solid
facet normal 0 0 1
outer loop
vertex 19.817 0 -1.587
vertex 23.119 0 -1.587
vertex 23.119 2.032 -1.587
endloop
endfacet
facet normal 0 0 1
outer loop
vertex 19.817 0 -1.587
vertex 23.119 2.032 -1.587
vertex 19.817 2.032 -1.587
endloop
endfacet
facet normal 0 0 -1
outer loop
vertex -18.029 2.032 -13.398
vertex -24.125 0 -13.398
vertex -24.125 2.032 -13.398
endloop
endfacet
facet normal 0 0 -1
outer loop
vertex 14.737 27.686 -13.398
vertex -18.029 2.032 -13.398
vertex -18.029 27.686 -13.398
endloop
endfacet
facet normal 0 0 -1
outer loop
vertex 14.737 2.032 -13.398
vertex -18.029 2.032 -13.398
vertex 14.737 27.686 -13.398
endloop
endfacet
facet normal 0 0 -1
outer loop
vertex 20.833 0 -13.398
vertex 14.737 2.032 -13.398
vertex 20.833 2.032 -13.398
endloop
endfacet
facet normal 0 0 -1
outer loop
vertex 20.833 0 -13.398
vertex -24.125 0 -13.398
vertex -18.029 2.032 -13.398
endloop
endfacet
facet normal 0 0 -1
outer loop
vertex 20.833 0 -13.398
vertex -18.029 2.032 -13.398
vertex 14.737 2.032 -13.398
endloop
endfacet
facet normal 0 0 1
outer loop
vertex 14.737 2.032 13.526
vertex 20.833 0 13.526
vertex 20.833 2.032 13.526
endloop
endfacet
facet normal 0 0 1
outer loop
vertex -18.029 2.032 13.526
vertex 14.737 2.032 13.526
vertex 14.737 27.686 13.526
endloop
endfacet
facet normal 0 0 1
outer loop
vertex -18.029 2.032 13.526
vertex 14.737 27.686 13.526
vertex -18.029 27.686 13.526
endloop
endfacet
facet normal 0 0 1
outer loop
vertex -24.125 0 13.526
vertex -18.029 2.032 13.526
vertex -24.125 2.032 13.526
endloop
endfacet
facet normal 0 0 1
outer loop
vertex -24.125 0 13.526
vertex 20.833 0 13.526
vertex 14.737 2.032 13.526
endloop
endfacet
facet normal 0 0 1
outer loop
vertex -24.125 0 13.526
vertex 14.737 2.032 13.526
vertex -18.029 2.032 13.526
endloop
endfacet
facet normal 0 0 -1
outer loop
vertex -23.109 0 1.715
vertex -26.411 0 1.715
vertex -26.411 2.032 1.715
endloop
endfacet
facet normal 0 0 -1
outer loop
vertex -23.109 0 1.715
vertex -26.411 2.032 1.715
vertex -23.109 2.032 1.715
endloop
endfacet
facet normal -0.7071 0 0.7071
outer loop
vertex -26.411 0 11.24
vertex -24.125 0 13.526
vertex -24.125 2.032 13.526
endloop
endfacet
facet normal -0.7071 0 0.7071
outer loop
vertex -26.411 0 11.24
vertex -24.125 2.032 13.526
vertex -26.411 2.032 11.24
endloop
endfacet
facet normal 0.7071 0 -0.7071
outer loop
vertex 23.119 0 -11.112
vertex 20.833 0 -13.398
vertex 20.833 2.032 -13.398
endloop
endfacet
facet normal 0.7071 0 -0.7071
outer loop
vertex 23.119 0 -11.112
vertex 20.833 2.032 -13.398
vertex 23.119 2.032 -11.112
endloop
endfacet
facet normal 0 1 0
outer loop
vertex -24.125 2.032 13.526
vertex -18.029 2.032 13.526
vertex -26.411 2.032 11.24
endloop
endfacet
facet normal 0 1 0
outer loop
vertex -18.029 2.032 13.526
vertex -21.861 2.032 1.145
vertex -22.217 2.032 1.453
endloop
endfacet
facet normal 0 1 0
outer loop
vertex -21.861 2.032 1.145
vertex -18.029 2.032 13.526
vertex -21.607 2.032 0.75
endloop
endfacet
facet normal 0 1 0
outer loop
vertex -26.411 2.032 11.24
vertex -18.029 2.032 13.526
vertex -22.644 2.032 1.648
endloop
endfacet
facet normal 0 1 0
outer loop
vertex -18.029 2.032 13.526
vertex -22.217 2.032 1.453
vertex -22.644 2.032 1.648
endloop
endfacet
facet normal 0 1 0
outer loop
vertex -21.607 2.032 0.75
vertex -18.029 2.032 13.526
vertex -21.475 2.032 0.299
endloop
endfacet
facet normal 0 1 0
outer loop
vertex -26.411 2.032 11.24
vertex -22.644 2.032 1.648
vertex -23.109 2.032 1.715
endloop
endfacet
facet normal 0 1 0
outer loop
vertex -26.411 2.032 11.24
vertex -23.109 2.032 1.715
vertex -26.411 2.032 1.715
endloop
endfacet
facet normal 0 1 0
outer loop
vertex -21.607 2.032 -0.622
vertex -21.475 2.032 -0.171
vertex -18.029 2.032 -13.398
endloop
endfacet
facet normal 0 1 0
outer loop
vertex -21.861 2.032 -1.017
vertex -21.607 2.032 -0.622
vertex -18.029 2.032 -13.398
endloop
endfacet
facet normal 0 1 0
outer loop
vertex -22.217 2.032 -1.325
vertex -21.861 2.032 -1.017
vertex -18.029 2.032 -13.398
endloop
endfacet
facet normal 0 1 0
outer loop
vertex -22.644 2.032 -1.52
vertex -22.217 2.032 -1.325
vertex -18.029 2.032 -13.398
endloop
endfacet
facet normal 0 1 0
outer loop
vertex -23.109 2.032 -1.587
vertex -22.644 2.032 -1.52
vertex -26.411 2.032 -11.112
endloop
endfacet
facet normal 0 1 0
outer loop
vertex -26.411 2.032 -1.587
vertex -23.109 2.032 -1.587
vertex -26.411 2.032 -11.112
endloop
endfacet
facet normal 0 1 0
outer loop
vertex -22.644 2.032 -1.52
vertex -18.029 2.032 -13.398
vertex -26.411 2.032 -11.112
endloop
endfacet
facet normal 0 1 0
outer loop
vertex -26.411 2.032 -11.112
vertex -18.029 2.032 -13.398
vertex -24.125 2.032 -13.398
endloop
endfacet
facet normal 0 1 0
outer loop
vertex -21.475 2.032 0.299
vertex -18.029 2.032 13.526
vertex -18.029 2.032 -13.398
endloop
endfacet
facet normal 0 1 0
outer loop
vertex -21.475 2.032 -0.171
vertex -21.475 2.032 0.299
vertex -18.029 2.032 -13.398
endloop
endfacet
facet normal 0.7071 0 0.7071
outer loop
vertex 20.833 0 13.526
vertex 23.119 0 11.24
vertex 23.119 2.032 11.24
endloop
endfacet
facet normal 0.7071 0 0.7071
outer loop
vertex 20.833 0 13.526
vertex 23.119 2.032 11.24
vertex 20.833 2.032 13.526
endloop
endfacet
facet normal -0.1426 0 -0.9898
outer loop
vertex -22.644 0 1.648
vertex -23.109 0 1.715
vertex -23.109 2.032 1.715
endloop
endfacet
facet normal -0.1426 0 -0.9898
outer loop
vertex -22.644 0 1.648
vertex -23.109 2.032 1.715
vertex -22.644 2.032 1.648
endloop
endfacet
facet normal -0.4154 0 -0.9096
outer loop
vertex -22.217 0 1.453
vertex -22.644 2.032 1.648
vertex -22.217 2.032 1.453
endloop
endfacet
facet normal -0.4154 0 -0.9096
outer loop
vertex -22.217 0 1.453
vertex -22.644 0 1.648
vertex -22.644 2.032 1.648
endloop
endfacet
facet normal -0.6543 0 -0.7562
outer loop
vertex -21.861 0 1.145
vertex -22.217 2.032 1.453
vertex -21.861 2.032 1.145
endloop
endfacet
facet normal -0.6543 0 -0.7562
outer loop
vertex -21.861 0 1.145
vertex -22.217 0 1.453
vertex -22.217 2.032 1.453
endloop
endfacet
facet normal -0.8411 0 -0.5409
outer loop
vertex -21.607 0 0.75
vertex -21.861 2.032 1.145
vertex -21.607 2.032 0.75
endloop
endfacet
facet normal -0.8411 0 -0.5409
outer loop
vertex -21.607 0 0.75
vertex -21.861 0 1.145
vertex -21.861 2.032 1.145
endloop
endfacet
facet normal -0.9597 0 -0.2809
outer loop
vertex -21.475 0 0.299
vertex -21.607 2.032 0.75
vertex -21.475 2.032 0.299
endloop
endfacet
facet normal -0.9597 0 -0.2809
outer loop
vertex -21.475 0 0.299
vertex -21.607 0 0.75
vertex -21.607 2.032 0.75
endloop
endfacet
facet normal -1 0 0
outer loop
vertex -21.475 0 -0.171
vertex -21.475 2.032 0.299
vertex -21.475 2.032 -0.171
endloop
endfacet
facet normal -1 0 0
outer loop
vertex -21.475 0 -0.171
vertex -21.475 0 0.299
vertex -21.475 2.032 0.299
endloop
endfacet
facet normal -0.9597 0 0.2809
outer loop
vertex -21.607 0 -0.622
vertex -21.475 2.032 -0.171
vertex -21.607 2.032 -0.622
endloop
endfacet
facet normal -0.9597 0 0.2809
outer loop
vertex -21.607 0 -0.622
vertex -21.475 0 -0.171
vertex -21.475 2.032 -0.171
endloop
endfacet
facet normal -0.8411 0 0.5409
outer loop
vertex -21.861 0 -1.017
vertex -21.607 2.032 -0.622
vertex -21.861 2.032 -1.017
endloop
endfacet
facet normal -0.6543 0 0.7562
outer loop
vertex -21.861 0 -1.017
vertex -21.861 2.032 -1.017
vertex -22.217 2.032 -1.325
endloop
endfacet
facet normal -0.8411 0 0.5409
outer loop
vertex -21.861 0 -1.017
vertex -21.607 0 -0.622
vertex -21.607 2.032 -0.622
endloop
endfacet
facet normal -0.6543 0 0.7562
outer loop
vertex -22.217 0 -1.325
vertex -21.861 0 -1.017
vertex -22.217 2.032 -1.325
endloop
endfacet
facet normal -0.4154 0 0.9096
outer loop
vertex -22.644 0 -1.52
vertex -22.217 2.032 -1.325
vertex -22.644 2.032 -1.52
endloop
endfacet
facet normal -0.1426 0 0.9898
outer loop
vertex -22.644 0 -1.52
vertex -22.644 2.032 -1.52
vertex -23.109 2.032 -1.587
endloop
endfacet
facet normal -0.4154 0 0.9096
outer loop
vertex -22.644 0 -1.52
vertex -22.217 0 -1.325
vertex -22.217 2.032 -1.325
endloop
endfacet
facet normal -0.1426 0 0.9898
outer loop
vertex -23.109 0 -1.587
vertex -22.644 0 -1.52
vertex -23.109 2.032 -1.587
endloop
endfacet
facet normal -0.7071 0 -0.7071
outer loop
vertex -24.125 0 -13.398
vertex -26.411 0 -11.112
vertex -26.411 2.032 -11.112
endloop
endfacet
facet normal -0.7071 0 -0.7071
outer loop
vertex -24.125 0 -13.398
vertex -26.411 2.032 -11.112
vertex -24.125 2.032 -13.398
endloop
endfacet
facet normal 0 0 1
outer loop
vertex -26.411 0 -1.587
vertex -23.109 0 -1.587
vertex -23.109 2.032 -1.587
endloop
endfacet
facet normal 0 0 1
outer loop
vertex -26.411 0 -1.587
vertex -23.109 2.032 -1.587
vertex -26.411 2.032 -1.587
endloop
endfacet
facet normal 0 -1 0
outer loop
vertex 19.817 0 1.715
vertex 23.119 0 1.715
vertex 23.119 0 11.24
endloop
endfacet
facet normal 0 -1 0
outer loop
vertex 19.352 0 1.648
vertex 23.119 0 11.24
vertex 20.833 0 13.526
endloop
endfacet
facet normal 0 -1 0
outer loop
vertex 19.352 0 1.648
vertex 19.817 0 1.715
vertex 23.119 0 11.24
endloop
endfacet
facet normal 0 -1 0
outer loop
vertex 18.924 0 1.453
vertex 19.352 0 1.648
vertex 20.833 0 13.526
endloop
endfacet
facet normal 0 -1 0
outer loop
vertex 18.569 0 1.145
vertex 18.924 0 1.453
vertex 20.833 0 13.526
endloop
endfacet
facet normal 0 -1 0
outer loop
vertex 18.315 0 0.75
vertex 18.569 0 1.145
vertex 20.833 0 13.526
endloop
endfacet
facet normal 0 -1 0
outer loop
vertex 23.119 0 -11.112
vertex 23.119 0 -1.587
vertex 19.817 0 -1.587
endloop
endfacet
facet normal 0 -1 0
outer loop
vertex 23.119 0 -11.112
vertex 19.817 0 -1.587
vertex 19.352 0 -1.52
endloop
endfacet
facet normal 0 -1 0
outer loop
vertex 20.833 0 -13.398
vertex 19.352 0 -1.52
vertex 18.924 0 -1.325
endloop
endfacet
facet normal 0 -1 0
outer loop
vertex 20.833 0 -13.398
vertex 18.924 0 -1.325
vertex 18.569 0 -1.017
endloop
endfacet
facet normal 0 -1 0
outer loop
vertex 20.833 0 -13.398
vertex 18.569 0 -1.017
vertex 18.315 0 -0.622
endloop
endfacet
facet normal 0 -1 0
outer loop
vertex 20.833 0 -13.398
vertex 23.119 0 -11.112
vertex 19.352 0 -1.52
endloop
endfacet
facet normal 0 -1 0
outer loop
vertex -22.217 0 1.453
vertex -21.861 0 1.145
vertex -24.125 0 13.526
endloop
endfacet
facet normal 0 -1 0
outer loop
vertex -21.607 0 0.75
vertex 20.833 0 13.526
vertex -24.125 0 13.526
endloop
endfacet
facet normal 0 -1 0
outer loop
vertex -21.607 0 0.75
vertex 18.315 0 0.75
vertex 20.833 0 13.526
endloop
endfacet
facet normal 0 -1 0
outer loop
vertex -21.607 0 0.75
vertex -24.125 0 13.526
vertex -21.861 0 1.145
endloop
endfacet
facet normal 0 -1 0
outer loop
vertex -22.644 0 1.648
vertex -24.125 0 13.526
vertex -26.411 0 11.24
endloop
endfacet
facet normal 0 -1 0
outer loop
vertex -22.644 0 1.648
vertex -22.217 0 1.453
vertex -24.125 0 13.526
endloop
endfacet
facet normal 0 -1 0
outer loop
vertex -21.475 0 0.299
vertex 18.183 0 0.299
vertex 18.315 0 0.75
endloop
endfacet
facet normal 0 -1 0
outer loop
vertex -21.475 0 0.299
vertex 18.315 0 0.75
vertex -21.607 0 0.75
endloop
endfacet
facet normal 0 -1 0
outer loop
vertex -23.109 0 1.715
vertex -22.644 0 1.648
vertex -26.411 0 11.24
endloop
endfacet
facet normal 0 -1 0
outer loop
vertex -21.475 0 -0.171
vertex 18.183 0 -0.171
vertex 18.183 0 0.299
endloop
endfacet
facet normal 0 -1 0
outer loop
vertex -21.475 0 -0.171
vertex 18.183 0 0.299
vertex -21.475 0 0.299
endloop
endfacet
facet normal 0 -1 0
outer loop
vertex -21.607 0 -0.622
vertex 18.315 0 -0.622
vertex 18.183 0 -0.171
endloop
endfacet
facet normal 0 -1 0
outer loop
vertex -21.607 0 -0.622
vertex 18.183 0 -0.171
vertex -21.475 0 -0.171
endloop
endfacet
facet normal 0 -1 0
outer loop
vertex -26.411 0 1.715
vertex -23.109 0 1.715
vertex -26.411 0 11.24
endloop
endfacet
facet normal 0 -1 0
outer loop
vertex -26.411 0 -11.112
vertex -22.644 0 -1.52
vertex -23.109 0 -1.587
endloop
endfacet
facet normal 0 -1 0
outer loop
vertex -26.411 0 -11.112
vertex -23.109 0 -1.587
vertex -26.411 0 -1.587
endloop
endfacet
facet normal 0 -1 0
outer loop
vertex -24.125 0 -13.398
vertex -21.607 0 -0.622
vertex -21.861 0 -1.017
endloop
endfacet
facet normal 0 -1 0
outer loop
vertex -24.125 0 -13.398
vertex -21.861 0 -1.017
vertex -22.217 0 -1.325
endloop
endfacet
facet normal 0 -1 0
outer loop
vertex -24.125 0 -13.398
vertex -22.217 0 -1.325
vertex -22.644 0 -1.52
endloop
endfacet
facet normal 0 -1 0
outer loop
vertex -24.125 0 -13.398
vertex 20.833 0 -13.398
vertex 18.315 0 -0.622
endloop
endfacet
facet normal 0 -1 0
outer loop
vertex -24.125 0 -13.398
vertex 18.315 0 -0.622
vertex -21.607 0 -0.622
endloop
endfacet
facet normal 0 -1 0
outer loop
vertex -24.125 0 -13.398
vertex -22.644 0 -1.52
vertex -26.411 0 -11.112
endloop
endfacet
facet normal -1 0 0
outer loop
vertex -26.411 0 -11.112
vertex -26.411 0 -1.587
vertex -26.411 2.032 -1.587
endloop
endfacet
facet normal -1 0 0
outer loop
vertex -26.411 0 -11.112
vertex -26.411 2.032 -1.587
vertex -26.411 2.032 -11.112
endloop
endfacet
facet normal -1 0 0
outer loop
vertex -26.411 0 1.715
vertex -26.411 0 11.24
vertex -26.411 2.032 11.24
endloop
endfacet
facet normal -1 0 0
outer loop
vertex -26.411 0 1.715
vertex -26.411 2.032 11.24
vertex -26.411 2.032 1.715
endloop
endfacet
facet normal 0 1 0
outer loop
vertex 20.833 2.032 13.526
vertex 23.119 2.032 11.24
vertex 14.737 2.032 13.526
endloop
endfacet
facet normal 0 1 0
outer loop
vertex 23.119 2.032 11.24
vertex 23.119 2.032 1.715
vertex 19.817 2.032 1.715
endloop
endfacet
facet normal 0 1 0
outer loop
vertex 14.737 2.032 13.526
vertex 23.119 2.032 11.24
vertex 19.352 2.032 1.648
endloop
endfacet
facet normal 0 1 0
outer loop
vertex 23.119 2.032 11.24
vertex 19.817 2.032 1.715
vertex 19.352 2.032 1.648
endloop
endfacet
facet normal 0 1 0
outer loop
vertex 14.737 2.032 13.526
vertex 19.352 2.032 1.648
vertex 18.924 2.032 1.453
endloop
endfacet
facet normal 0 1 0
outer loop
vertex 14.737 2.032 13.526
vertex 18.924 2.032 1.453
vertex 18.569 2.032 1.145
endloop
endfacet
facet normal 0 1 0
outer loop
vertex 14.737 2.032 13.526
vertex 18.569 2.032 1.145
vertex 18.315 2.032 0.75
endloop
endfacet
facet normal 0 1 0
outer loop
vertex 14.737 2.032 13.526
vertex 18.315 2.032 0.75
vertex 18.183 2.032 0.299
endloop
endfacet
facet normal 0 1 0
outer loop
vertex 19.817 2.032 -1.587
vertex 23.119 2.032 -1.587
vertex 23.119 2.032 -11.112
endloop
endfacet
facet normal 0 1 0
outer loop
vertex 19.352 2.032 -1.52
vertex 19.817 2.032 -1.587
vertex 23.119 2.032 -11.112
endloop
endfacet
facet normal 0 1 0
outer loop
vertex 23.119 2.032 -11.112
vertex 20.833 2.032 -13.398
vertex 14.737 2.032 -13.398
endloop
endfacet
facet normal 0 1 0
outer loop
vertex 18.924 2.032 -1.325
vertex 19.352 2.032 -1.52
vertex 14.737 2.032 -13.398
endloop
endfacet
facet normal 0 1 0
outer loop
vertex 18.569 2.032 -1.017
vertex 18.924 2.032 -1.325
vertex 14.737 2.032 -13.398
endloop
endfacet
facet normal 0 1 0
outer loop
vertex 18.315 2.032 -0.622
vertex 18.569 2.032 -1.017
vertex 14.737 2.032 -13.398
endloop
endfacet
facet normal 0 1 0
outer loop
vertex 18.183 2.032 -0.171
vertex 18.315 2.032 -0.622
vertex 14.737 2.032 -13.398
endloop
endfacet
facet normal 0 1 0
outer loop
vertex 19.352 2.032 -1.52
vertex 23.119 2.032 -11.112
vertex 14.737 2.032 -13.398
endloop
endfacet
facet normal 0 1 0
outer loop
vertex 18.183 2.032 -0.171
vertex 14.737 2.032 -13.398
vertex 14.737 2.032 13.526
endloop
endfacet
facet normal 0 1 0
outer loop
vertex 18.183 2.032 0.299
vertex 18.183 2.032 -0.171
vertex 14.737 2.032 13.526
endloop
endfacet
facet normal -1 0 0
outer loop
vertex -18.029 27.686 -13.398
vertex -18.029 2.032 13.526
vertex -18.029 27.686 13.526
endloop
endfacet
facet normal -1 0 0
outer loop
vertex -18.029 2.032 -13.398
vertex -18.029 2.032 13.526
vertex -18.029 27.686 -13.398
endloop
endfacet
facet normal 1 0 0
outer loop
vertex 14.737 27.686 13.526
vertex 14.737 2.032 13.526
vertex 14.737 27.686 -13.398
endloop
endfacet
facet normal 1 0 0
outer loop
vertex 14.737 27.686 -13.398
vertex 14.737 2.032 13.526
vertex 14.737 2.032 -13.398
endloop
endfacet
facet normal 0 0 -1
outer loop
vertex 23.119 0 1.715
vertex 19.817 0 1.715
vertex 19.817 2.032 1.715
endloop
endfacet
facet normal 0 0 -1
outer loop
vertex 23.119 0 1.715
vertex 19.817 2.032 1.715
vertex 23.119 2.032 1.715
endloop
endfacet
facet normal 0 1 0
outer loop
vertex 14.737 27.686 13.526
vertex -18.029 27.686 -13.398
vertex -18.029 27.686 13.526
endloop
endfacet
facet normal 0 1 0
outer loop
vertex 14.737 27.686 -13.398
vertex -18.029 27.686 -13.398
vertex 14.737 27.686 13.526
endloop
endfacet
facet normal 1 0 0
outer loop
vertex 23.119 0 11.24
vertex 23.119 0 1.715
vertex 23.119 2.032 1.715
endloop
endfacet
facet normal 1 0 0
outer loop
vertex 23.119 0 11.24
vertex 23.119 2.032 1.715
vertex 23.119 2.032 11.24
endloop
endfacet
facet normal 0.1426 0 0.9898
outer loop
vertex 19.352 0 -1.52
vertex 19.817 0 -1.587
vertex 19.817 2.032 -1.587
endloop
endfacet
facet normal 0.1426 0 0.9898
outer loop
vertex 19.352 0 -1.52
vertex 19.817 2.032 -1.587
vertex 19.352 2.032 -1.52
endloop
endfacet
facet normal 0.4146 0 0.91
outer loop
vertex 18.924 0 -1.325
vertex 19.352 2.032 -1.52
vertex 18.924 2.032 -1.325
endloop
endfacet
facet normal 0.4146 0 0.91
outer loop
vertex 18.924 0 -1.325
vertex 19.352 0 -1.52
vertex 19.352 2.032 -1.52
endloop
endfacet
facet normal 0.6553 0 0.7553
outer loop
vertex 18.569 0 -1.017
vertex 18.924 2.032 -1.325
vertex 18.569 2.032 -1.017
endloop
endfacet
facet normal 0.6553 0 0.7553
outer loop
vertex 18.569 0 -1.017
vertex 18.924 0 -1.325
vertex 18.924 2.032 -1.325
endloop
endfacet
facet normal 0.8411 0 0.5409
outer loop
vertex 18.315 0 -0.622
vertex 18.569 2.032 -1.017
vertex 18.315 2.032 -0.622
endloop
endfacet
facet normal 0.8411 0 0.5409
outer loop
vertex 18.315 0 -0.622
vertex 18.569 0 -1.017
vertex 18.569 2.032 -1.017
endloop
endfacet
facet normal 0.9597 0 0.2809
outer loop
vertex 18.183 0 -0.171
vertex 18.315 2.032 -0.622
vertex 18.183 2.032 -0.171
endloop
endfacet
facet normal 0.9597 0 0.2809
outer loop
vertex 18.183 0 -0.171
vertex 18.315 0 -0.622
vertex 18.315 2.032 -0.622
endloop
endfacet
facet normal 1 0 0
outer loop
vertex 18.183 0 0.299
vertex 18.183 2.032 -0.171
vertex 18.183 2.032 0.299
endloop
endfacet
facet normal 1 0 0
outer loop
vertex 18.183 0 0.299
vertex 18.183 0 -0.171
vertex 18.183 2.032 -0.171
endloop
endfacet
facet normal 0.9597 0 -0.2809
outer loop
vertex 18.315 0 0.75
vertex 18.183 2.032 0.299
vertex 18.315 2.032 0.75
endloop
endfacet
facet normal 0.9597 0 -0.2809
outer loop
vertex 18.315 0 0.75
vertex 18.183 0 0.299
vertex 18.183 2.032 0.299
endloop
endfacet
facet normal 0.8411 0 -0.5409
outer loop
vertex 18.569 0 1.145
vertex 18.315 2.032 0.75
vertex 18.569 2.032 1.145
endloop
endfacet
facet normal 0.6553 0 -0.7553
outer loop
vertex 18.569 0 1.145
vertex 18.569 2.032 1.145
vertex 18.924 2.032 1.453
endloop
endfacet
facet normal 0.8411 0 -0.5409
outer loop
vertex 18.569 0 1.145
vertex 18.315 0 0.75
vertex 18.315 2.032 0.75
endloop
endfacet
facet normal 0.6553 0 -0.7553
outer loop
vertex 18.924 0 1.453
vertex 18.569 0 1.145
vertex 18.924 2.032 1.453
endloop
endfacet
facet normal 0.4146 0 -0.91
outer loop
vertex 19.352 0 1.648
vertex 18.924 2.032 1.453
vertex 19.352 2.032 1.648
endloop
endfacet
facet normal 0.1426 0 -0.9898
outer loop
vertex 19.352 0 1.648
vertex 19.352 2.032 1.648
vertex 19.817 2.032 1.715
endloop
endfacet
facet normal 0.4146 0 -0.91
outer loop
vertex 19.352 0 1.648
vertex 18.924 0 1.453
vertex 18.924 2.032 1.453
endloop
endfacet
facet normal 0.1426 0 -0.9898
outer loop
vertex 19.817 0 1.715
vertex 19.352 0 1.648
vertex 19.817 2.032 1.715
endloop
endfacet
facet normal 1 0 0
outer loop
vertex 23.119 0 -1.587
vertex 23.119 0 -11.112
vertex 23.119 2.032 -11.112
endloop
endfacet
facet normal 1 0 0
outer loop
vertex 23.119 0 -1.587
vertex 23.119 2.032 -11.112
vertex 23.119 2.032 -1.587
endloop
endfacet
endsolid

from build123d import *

# Parameters (mm, degrees)
SKETCH1_W           = 32.766
SKETCH1_H           = 26.924
BOSS_EXTRUDE1_DEPTH = 27.686
BOSS_EXTRUDE2_DEPTH = 2.032
BOSS_EXTRUDE3_DEPTH = 2.032


with BuildPart() as part:
    # Sketch1 → Boss-Extrude1 (new body)
    with BuildSketch(Plane(origin=(0, 0, 0), x_dir=(1, 0, 0), z_dir=(0, 1, 0))):
        with Locations((-1.646230698, -0.06385993)):
            Rectangle(SKETCH1_W, SKETCH1_H)
    extrude(amount=BOSS_EXTRUDE1_DEPTH)

    # Sketch1<12> → Boss-Extrude2 (add)
    with BuildSketch(Plane(origin=(0, 0, 0), x_dir=(1, 0, 0), z_dir=(0, 1, 0))):
        with BuildLine():
            Line((-18.029230698, 13.39814007), (-18.029230698, -13.52585993))
            Line((-18.029230698, -13.52585993), (-24.125230698, -13.52585993))
            Line((-24.125230698, -13.52585993), (-26.411230698, -11.23985993))
            Line((-26.411230698, -11.23985993), (-26.411230698, -1.71485993))
            Line((-26.411230698, -1.71485993), (-23.109230698, -1.71485993))
            ThreePointArc((-23.109230698, -1.71485993), (-21.458230698, -0.06385993), (-23.109230698, 1.58714007))
            Line((-23.109230698, 1.58714007), (-26.411230698, 1.58714007))
            Line((-26.411230698, 1.58714007), (-26.411230698, 11.11214007))
            Line((-26.411230698, 11.11214007), (-24.125230698, 13.39814007))
            Line((-24.125230698, 13.39814007), (-18.029230698, 13.39814007))
        make_face()
    extrude(amount=BOSS_EXTRUDE2_DEPTH)

    # Sketch1<13> → Boss-Extrude3 (add)
    with BuildSketch(Plane(origin=(0, 0, 0), x_dir=(1, 0, 0), z_dir=(0, 1, 0))):
        with BuildLine():
            Line((20.832769302, -13.52585993), (14.736769302, -13.52585993))
            Line((14.736769302, -13.52585993), (14.736769302, 13.39814007))
            Line((14.736769302, 13.39814007), (20.832769302, 13.39814007))
            Line((20.832769302, 13.39814007), (23.118769302, 11.11214007))
            Line((23.118769302, 11.11214007), (23.118769302, 1.58714007))
            Line((23.118769302, 1.58714007), (19.816769302, 1.58714007))
            ThreePointArc((19.816769302, 1.58714007), (18.165769302, -0.06385993), (19.816769302, -1.71485993))
            Line((19.816769302, -1.71485993), (23.118769302, -1.71485993))
            Line((23.118769302, -1.71485993), (23.118769302, -11.23985993))
            Line((23.118769302, -11.23985993), (20.832769302, -13.52585993))
        make_face()
    extrude(amount=BOSS_EXTRUDE3_DEPTH)


solid = part.part
